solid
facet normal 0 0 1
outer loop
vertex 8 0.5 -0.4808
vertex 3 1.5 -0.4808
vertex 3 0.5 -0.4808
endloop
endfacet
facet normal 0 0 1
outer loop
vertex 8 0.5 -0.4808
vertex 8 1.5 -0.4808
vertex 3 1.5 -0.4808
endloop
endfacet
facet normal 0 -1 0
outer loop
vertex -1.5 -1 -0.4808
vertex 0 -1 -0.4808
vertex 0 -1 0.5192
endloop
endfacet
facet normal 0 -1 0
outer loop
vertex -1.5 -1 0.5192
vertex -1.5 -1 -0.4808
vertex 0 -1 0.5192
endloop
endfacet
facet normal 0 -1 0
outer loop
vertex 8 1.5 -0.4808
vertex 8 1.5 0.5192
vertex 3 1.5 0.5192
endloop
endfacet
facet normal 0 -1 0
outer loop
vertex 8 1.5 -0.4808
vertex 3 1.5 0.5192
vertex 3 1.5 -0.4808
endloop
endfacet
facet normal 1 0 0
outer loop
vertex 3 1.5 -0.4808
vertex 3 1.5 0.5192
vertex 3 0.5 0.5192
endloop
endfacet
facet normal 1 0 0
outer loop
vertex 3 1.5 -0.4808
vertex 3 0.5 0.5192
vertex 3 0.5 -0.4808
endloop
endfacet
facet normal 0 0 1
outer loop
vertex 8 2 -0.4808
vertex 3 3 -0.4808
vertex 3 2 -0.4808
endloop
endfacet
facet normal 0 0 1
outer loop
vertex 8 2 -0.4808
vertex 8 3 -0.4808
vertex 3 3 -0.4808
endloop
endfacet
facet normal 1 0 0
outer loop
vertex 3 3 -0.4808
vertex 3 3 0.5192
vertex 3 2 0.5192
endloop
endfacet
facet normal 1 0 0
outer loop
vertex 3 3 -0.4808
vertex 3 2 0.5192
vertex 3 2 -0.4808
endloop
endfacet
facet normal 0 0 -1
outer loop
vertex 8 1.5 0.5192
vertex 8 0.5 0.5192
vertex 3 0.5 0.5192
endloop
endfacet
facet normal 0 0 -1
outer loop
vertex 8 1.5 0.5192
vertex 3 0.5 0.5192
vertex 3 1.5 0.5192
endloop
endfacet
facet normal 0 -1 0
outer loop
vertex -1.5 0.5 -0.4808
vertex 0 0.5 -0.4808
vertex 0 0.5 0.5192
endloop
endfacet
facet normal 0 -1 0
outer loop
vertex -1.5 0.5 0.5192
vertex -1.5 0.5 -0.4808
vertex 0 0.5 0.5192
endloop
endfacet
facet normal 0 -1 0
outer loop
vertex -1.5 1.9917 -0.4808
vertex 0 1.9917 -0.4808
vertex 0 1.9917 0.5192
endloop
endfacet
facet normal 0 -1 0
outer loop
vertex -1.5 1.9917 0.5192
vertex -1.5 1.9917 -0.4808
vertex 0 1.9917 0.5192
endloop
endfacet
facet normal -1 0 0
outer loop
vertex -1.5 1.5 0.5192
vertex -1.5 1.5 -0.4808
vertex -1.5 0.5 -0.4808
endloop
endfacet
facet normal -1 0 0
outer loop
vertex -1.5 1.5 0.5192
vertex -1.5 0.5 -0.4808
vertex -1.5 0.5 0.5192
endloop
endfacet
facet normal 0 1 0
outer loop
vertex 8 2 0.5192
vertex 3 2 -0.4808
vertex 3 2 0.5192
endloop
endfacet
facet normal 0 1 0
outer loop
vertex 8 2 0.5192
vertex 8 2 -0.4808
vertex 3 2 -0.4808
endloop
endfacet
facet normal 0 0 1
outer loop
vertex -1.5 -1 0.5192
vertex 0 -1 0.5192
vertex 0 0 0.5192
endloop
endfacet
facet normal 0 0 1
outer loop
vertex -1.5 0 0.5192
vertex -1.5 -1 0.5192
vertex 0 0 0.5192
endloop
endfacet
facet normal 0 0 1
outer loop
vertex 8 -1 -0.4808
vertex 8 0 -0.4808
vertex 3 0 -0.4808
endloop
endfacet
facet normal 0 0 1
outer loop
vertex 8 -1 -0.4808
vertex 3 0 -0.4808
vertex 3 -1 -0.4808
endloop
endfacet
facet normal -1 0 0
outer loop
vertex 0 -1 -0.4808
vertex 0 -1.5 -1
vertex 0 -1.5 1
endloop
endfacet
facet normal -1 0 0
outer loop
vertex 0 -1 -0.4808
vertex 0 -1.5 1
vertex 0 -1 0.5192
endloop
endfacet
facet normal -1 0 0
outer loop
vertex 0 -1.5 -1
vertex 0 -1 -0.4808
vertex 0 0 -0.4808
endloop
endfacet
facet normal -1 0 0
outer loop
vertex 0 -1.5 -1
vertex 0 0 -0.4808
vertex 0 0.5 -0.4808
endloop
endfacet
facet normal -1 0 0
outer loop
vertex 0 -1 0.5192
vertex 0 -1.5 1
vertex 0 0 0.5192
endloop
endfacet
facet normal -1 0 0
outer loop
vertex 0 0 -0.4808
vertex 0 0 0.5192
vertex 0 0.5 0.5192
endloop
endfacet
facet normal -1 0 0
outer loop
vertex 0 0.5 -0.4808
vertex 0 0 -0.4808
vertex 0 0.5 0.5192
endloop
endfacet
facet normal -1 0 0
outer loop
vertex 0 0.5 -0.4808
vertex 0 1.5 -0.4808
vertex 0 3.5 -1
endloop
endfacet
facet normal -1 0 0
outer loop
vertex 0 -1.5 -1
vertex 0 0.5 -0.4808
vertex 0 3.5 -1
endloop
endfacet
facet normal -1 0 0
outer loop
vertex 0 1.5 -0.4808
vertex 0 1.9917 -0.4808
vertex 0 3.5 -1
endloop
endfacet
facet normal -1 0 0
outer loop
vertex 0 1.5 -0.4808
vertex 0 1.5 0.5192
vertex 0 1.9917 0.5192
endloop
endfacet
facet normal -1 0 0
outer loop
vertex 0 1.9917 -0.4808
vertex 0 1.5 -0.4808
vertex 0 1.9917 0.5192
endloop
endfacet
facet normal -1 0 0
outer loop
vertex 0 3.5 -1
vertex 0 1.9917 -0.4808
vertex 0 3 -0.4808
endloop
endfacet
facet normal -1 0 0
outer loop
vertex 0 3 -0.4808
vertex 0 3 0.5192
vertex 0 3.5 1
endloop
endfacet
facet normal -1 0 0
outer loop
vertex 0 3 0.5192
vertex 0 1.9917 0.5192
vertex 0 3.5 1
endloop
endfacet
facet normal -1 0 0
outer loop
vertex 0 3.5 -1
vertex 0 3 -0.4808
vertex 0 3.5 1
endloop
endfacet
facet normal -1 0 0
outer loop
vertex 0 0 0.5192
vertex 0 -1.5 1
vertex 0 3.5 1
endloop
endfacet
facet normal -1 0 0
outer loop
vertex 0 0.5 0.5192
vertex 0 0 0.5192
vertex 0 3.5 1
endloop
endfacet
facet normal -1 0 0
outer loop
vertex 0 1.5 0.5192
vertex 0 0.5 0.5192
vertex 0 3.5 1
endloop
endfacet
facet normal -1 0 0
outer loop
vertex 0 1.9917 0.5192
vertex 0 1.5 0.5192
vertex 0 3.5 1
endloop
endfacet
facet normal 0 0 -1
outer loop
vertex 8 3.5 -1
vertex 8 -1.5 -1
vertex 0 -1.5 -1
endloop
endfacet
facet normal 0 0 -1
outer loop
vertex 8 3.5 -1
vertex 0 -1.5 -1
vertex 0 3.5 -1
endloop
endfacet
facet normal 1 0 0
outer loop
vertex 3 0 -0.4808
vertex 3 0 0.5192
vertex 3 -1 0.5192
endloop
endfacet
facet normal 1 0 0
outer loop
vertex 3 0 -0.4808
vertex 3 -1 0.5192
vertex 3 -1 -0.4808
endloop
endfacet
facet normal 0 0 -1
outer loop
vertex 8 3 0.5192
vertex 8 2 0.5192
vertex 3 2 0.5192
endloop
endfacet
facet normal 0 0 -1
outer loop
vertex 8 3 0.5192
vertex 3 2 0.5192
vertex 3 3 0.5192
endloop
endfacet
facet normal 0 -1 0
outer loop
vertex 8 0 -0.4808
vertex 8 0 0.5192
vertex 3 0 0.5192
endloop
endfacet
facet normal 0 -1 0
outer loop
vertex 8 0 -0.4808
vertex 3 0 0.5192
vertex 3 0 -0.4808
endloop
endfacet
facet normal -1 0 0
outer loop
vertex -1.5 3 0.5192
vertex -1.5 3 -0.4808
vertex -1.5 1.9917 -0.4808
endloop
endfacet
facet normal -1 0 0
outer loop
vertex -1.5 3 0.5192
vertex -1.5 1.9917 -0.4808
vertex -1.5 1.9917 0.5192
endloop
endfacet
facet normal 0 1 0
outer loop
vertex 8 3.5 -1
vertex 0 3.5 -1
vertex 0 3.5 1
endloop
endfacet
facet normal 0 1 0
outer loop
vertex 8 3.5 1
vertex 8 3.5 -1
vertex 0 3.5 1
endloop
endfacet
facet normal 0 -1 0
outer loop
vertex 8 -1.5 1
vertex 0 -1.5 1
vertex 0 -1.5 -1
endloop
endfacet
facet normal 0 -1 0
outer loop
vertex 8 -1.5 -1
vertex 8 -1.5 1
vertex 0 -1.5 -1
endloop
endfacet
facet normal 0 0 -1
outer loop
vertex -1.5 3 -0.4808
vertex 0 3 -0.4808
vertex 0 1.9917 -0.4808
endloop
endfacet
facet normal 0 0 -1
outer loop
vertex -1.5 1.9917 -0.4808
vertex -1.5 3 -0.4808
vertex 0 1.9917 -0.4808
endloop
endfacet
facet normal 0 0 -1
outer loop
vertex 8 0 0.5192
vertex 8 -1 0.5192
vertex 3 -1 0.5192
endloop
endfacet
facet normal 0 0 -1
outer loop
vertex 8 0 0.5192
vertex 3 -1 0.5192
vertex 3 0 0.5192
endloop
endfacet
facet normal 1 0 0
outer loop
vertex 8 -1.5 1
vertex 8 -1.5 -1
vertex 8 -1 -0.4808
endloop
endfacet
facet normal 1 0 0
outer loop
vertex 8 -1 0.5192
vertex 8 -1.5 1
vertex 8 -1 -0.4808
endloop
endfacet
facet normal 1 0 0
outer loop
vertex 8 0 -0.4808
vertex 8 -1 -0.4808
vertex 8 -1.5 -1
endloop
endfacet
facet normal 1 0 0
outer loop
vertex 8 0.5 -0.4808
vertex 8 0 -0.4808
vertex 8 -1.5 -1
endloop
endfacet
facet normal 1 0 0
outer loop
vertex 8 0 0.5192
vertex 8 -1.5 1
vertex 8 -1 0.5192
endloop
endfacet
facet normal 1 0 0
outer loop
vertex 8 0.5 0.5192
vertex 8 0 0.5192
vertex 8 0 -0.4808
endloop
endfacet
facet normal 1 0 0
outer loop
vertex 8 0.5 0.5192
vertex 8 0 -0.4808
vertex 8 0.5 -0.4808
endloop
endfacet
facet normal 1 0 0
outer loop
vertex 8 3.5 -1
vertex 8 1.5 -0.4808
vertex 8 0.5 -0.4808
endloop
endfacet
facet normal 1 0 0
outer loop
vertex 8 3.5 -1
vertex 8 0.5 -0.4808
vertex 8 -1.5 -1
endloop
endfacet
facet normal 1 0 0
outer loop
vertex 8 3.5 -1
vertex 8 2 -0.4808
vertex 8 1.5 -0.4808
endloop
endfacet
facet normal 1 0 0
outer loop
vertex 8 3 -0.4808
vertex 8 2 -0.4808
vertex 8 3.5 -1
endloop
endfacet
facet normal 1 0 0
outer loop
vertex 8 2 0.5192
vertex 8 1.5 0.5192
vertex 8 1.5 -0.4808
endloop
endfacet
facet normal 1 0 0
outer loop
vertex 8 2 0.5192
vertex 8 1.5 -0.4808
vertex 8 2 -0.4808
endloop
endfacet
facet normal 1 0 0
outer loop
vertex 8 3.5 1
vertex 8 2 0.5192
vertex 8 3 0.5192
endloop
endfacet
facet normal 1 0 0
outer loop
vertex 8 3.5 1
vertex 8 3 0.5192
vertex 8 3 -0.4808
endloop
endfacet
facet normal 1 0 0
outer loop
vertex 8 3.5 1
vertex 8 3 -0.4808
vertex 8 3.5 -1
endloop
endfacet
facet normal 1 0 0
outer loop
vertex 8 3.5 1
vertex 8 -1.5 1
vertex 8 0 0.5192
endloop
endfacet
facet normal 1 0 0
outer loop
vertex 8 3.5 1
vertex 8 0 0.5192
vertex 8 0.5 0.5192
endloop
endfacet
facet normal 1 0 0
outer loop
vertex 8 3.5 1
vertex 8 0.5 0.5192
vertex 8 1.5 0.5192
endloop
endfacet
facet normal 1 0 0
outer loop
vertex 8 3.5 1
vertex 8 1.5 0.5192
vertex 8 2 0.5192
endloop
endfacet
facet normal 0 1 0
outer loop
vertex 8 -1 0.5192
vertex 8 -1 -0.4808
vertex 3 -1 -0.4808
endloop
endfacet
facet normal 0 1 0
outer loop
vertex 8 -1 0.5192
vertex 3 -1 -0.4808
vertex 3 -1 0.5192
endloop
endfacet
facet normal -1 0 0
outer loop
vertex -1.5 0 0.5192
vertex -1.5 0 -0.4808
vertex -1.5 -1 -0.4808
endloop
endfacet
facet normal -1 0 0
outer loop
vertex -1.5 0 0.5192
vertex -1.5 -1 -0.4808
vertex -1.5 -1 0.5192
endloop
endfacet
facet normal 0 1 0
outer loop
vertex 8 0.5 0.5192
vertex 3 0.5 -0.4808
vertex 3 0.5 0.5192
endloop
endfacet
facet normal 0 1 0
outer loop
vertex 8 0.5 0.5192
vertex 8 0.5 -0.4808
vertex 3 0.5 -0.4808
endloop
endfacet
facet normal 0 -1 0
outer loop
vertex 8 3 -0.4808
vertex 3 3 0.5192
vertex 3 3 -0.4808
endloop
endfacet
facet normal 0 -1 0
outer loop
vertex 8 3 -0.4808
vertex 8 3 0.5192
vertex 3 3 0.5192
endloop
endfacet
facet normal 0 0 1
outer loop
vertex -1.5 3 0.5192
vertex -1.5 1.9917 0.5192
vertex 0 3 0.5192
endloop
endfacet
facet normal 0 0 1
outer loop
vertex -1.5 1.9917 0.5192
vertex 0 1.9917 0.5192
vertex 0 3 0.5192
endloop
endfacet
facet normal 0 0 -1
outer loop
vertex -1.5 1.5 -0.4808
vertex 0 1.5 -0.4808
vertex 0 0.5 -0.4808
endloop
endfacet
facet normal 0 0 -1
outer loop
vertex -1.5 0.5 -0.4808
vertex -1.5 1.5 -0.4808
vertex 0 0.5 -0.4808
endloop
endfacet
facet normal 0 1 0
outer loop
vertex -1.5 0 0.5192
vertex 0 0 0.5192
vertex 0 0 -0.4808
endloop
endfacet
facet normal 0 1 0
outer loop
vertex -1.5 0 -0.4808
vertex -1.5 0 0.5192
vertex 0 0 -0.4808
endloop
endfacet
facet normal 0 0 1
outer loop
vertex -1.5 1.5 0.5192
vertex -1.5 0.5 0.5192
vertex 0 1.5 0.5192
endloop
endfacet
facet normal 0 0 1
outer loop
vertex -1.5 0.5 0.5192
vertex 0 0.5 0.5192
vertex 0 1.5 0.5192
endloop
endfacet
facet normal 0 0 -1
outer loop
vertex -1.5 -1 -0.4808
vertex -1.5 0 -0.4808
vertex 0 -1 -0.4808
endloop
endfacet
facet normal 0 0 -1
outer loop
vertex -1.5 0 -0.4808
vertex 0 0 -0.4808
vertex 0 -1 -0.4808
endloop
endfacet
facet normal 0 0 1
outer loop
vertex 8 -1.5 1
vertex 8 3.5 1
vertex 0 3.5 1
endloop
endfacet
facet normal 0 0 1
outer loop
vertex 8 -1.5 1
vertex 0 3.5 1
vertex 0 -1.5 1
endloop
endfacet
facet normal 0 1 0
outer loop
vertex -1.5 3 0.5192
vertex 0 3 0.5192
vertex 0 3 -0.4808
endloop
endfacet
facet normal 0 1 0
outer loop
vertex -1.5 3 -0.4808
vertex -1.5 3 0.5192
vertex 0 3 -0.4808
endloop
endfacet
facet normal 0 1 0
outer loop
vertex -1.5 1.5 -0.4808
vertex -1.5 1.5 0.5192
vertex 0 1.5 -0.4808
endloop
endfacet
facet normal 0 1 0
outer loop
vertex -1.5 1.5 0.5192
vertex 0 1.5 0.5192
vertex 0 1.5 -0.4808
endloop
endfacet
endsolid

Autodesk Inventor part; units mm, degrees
ref_plane "YZ Plane" through (0, 0, 0) normal (1, 0, 0) x (0, 1, 0)
ref_plane "XZ Plane" through (0, 0, 0) normal (0, 1, 0) x (-1, 0, 0)
ref_plane "XY Plane" through (0, 0, 0) normal (0, 0, 1) x (1, 0, 0)
sketch "Sketch1" plane through (0, 0, 0) normal (1, 0, 0) x (0, 1, 0)
  line L0 (3.5, 1) -> (-1.5, 1)
  line L1 (-1.5, 1) -> (-1.5, -1)
  line L2 (-1.5, -1) -> (3.5, -1)
  line L3 (3.5, -1) -> (3.5, 1)
  point P0 (0, 0)
  dimension "d0" = 2
  dimension "d1" = 5
  dimension "d2" = 3.5
  dimension "d3" = 1
extrude "Extrusion1" add sketch "Sketch1" along normal blind 8
sketch "Sketch2" plane through (8, 0, 0) normal (1, 0, 0) x (0, 0, -1)
  line L0 (-0.5192, 3) -> (0.4808, 3)
  line L1 (0.4808, 3) -> (0.4808, 2)
  line L2 (0.4808, 2) -> (-0.5192, 2)
  line L3 (-0.5192, 2) -> (-0.5192, 3)
  line L4 (-0.5192, 1.5) -> (0.4808, 1.5)
  line L5 (0.4808, 1.5) -> (0.4808, 0.5)
  line L6 (0.4808, 0.5) -> (-0.5192, 0.5)
  line L7 (-0.5192, 0.5) -> (-0.5192, 1.5)
  line L8 (-0.5192, 0) -> (0.4808, 0)
  line L9 (0.4808, 0) -> (0.4808, -1)
  line L10 (0.4808, -1) -> (-0.5192, -1)
  line L11 (-0.5192, -1) -> (-0.5192, 0)
  line L12 (1, 3.5) -> (-1, 3.5) projected
  point P0 (0, 0)
  dimension "d6" = 1
  dimension "d7" = 1
  dimension "d8" = 1
  dimension "d9" = 1
  dimension "d10" = 1
  dimension "d11" = 0.5
  dimension "d12" = 0.5
  dimension "d13" = 0.5
extrude "Extrusion2" cut sketch "Sketch2" against normal blind 5
sketch "Sketch3" plane through (0, 0, 0) normal (-1, 0, 0) x (0, 0, 1)
  line L0 (-0.4808, 0) -> (-0.4808, -1) projected
  line L1 (0.5192, -1) -> (0.5192, 0) projected
  line L2 (-0.4808, -1) -> (0.5192, -1)
  line L3 (0.5192, -1) -> (0.5192, 0)
  line L4 (0.5192, 0) -> (-0.4808, 0)
  line L5 (-0.4808, 0) -> (-0.4808, -1)
  line L6 (-0.4808, 1.5) -> (-0.4808, 0.5) projected
  line L7 (0.5192, 1.5) -> (-0.4808, 1.5) projected
  line L8 (-0.4808, 0.5) -> (0.5192, 0.5)
  line L9 (0.5192, 0.5) -> (0.5192, 1.5)
  line L10 (0.5192, 1.5) -> (-0.4808, 1.5)
  line L11 (-0.4808, 1.5) -> (-0.4808, 0.5)
  line L12 (0.5192, 2) -> (0.5192, 3) projected
  line L13 (-0.4808, 1.9917) -> (0.5192, 1.9917)
  line L14 (0.5192, 1.9917) -> (0.5192, 3)
  line L15 (0.5192, 3) -> (-0.4808, 3)
  line L16 (-0.4808, 3) -> (-0.4808, 1.9917)
  point P0 (0, 0)
extrude "Extrusion3" add sketch "Sketch3" along normal blind 1.5
properties part number "konektorservomotora"
